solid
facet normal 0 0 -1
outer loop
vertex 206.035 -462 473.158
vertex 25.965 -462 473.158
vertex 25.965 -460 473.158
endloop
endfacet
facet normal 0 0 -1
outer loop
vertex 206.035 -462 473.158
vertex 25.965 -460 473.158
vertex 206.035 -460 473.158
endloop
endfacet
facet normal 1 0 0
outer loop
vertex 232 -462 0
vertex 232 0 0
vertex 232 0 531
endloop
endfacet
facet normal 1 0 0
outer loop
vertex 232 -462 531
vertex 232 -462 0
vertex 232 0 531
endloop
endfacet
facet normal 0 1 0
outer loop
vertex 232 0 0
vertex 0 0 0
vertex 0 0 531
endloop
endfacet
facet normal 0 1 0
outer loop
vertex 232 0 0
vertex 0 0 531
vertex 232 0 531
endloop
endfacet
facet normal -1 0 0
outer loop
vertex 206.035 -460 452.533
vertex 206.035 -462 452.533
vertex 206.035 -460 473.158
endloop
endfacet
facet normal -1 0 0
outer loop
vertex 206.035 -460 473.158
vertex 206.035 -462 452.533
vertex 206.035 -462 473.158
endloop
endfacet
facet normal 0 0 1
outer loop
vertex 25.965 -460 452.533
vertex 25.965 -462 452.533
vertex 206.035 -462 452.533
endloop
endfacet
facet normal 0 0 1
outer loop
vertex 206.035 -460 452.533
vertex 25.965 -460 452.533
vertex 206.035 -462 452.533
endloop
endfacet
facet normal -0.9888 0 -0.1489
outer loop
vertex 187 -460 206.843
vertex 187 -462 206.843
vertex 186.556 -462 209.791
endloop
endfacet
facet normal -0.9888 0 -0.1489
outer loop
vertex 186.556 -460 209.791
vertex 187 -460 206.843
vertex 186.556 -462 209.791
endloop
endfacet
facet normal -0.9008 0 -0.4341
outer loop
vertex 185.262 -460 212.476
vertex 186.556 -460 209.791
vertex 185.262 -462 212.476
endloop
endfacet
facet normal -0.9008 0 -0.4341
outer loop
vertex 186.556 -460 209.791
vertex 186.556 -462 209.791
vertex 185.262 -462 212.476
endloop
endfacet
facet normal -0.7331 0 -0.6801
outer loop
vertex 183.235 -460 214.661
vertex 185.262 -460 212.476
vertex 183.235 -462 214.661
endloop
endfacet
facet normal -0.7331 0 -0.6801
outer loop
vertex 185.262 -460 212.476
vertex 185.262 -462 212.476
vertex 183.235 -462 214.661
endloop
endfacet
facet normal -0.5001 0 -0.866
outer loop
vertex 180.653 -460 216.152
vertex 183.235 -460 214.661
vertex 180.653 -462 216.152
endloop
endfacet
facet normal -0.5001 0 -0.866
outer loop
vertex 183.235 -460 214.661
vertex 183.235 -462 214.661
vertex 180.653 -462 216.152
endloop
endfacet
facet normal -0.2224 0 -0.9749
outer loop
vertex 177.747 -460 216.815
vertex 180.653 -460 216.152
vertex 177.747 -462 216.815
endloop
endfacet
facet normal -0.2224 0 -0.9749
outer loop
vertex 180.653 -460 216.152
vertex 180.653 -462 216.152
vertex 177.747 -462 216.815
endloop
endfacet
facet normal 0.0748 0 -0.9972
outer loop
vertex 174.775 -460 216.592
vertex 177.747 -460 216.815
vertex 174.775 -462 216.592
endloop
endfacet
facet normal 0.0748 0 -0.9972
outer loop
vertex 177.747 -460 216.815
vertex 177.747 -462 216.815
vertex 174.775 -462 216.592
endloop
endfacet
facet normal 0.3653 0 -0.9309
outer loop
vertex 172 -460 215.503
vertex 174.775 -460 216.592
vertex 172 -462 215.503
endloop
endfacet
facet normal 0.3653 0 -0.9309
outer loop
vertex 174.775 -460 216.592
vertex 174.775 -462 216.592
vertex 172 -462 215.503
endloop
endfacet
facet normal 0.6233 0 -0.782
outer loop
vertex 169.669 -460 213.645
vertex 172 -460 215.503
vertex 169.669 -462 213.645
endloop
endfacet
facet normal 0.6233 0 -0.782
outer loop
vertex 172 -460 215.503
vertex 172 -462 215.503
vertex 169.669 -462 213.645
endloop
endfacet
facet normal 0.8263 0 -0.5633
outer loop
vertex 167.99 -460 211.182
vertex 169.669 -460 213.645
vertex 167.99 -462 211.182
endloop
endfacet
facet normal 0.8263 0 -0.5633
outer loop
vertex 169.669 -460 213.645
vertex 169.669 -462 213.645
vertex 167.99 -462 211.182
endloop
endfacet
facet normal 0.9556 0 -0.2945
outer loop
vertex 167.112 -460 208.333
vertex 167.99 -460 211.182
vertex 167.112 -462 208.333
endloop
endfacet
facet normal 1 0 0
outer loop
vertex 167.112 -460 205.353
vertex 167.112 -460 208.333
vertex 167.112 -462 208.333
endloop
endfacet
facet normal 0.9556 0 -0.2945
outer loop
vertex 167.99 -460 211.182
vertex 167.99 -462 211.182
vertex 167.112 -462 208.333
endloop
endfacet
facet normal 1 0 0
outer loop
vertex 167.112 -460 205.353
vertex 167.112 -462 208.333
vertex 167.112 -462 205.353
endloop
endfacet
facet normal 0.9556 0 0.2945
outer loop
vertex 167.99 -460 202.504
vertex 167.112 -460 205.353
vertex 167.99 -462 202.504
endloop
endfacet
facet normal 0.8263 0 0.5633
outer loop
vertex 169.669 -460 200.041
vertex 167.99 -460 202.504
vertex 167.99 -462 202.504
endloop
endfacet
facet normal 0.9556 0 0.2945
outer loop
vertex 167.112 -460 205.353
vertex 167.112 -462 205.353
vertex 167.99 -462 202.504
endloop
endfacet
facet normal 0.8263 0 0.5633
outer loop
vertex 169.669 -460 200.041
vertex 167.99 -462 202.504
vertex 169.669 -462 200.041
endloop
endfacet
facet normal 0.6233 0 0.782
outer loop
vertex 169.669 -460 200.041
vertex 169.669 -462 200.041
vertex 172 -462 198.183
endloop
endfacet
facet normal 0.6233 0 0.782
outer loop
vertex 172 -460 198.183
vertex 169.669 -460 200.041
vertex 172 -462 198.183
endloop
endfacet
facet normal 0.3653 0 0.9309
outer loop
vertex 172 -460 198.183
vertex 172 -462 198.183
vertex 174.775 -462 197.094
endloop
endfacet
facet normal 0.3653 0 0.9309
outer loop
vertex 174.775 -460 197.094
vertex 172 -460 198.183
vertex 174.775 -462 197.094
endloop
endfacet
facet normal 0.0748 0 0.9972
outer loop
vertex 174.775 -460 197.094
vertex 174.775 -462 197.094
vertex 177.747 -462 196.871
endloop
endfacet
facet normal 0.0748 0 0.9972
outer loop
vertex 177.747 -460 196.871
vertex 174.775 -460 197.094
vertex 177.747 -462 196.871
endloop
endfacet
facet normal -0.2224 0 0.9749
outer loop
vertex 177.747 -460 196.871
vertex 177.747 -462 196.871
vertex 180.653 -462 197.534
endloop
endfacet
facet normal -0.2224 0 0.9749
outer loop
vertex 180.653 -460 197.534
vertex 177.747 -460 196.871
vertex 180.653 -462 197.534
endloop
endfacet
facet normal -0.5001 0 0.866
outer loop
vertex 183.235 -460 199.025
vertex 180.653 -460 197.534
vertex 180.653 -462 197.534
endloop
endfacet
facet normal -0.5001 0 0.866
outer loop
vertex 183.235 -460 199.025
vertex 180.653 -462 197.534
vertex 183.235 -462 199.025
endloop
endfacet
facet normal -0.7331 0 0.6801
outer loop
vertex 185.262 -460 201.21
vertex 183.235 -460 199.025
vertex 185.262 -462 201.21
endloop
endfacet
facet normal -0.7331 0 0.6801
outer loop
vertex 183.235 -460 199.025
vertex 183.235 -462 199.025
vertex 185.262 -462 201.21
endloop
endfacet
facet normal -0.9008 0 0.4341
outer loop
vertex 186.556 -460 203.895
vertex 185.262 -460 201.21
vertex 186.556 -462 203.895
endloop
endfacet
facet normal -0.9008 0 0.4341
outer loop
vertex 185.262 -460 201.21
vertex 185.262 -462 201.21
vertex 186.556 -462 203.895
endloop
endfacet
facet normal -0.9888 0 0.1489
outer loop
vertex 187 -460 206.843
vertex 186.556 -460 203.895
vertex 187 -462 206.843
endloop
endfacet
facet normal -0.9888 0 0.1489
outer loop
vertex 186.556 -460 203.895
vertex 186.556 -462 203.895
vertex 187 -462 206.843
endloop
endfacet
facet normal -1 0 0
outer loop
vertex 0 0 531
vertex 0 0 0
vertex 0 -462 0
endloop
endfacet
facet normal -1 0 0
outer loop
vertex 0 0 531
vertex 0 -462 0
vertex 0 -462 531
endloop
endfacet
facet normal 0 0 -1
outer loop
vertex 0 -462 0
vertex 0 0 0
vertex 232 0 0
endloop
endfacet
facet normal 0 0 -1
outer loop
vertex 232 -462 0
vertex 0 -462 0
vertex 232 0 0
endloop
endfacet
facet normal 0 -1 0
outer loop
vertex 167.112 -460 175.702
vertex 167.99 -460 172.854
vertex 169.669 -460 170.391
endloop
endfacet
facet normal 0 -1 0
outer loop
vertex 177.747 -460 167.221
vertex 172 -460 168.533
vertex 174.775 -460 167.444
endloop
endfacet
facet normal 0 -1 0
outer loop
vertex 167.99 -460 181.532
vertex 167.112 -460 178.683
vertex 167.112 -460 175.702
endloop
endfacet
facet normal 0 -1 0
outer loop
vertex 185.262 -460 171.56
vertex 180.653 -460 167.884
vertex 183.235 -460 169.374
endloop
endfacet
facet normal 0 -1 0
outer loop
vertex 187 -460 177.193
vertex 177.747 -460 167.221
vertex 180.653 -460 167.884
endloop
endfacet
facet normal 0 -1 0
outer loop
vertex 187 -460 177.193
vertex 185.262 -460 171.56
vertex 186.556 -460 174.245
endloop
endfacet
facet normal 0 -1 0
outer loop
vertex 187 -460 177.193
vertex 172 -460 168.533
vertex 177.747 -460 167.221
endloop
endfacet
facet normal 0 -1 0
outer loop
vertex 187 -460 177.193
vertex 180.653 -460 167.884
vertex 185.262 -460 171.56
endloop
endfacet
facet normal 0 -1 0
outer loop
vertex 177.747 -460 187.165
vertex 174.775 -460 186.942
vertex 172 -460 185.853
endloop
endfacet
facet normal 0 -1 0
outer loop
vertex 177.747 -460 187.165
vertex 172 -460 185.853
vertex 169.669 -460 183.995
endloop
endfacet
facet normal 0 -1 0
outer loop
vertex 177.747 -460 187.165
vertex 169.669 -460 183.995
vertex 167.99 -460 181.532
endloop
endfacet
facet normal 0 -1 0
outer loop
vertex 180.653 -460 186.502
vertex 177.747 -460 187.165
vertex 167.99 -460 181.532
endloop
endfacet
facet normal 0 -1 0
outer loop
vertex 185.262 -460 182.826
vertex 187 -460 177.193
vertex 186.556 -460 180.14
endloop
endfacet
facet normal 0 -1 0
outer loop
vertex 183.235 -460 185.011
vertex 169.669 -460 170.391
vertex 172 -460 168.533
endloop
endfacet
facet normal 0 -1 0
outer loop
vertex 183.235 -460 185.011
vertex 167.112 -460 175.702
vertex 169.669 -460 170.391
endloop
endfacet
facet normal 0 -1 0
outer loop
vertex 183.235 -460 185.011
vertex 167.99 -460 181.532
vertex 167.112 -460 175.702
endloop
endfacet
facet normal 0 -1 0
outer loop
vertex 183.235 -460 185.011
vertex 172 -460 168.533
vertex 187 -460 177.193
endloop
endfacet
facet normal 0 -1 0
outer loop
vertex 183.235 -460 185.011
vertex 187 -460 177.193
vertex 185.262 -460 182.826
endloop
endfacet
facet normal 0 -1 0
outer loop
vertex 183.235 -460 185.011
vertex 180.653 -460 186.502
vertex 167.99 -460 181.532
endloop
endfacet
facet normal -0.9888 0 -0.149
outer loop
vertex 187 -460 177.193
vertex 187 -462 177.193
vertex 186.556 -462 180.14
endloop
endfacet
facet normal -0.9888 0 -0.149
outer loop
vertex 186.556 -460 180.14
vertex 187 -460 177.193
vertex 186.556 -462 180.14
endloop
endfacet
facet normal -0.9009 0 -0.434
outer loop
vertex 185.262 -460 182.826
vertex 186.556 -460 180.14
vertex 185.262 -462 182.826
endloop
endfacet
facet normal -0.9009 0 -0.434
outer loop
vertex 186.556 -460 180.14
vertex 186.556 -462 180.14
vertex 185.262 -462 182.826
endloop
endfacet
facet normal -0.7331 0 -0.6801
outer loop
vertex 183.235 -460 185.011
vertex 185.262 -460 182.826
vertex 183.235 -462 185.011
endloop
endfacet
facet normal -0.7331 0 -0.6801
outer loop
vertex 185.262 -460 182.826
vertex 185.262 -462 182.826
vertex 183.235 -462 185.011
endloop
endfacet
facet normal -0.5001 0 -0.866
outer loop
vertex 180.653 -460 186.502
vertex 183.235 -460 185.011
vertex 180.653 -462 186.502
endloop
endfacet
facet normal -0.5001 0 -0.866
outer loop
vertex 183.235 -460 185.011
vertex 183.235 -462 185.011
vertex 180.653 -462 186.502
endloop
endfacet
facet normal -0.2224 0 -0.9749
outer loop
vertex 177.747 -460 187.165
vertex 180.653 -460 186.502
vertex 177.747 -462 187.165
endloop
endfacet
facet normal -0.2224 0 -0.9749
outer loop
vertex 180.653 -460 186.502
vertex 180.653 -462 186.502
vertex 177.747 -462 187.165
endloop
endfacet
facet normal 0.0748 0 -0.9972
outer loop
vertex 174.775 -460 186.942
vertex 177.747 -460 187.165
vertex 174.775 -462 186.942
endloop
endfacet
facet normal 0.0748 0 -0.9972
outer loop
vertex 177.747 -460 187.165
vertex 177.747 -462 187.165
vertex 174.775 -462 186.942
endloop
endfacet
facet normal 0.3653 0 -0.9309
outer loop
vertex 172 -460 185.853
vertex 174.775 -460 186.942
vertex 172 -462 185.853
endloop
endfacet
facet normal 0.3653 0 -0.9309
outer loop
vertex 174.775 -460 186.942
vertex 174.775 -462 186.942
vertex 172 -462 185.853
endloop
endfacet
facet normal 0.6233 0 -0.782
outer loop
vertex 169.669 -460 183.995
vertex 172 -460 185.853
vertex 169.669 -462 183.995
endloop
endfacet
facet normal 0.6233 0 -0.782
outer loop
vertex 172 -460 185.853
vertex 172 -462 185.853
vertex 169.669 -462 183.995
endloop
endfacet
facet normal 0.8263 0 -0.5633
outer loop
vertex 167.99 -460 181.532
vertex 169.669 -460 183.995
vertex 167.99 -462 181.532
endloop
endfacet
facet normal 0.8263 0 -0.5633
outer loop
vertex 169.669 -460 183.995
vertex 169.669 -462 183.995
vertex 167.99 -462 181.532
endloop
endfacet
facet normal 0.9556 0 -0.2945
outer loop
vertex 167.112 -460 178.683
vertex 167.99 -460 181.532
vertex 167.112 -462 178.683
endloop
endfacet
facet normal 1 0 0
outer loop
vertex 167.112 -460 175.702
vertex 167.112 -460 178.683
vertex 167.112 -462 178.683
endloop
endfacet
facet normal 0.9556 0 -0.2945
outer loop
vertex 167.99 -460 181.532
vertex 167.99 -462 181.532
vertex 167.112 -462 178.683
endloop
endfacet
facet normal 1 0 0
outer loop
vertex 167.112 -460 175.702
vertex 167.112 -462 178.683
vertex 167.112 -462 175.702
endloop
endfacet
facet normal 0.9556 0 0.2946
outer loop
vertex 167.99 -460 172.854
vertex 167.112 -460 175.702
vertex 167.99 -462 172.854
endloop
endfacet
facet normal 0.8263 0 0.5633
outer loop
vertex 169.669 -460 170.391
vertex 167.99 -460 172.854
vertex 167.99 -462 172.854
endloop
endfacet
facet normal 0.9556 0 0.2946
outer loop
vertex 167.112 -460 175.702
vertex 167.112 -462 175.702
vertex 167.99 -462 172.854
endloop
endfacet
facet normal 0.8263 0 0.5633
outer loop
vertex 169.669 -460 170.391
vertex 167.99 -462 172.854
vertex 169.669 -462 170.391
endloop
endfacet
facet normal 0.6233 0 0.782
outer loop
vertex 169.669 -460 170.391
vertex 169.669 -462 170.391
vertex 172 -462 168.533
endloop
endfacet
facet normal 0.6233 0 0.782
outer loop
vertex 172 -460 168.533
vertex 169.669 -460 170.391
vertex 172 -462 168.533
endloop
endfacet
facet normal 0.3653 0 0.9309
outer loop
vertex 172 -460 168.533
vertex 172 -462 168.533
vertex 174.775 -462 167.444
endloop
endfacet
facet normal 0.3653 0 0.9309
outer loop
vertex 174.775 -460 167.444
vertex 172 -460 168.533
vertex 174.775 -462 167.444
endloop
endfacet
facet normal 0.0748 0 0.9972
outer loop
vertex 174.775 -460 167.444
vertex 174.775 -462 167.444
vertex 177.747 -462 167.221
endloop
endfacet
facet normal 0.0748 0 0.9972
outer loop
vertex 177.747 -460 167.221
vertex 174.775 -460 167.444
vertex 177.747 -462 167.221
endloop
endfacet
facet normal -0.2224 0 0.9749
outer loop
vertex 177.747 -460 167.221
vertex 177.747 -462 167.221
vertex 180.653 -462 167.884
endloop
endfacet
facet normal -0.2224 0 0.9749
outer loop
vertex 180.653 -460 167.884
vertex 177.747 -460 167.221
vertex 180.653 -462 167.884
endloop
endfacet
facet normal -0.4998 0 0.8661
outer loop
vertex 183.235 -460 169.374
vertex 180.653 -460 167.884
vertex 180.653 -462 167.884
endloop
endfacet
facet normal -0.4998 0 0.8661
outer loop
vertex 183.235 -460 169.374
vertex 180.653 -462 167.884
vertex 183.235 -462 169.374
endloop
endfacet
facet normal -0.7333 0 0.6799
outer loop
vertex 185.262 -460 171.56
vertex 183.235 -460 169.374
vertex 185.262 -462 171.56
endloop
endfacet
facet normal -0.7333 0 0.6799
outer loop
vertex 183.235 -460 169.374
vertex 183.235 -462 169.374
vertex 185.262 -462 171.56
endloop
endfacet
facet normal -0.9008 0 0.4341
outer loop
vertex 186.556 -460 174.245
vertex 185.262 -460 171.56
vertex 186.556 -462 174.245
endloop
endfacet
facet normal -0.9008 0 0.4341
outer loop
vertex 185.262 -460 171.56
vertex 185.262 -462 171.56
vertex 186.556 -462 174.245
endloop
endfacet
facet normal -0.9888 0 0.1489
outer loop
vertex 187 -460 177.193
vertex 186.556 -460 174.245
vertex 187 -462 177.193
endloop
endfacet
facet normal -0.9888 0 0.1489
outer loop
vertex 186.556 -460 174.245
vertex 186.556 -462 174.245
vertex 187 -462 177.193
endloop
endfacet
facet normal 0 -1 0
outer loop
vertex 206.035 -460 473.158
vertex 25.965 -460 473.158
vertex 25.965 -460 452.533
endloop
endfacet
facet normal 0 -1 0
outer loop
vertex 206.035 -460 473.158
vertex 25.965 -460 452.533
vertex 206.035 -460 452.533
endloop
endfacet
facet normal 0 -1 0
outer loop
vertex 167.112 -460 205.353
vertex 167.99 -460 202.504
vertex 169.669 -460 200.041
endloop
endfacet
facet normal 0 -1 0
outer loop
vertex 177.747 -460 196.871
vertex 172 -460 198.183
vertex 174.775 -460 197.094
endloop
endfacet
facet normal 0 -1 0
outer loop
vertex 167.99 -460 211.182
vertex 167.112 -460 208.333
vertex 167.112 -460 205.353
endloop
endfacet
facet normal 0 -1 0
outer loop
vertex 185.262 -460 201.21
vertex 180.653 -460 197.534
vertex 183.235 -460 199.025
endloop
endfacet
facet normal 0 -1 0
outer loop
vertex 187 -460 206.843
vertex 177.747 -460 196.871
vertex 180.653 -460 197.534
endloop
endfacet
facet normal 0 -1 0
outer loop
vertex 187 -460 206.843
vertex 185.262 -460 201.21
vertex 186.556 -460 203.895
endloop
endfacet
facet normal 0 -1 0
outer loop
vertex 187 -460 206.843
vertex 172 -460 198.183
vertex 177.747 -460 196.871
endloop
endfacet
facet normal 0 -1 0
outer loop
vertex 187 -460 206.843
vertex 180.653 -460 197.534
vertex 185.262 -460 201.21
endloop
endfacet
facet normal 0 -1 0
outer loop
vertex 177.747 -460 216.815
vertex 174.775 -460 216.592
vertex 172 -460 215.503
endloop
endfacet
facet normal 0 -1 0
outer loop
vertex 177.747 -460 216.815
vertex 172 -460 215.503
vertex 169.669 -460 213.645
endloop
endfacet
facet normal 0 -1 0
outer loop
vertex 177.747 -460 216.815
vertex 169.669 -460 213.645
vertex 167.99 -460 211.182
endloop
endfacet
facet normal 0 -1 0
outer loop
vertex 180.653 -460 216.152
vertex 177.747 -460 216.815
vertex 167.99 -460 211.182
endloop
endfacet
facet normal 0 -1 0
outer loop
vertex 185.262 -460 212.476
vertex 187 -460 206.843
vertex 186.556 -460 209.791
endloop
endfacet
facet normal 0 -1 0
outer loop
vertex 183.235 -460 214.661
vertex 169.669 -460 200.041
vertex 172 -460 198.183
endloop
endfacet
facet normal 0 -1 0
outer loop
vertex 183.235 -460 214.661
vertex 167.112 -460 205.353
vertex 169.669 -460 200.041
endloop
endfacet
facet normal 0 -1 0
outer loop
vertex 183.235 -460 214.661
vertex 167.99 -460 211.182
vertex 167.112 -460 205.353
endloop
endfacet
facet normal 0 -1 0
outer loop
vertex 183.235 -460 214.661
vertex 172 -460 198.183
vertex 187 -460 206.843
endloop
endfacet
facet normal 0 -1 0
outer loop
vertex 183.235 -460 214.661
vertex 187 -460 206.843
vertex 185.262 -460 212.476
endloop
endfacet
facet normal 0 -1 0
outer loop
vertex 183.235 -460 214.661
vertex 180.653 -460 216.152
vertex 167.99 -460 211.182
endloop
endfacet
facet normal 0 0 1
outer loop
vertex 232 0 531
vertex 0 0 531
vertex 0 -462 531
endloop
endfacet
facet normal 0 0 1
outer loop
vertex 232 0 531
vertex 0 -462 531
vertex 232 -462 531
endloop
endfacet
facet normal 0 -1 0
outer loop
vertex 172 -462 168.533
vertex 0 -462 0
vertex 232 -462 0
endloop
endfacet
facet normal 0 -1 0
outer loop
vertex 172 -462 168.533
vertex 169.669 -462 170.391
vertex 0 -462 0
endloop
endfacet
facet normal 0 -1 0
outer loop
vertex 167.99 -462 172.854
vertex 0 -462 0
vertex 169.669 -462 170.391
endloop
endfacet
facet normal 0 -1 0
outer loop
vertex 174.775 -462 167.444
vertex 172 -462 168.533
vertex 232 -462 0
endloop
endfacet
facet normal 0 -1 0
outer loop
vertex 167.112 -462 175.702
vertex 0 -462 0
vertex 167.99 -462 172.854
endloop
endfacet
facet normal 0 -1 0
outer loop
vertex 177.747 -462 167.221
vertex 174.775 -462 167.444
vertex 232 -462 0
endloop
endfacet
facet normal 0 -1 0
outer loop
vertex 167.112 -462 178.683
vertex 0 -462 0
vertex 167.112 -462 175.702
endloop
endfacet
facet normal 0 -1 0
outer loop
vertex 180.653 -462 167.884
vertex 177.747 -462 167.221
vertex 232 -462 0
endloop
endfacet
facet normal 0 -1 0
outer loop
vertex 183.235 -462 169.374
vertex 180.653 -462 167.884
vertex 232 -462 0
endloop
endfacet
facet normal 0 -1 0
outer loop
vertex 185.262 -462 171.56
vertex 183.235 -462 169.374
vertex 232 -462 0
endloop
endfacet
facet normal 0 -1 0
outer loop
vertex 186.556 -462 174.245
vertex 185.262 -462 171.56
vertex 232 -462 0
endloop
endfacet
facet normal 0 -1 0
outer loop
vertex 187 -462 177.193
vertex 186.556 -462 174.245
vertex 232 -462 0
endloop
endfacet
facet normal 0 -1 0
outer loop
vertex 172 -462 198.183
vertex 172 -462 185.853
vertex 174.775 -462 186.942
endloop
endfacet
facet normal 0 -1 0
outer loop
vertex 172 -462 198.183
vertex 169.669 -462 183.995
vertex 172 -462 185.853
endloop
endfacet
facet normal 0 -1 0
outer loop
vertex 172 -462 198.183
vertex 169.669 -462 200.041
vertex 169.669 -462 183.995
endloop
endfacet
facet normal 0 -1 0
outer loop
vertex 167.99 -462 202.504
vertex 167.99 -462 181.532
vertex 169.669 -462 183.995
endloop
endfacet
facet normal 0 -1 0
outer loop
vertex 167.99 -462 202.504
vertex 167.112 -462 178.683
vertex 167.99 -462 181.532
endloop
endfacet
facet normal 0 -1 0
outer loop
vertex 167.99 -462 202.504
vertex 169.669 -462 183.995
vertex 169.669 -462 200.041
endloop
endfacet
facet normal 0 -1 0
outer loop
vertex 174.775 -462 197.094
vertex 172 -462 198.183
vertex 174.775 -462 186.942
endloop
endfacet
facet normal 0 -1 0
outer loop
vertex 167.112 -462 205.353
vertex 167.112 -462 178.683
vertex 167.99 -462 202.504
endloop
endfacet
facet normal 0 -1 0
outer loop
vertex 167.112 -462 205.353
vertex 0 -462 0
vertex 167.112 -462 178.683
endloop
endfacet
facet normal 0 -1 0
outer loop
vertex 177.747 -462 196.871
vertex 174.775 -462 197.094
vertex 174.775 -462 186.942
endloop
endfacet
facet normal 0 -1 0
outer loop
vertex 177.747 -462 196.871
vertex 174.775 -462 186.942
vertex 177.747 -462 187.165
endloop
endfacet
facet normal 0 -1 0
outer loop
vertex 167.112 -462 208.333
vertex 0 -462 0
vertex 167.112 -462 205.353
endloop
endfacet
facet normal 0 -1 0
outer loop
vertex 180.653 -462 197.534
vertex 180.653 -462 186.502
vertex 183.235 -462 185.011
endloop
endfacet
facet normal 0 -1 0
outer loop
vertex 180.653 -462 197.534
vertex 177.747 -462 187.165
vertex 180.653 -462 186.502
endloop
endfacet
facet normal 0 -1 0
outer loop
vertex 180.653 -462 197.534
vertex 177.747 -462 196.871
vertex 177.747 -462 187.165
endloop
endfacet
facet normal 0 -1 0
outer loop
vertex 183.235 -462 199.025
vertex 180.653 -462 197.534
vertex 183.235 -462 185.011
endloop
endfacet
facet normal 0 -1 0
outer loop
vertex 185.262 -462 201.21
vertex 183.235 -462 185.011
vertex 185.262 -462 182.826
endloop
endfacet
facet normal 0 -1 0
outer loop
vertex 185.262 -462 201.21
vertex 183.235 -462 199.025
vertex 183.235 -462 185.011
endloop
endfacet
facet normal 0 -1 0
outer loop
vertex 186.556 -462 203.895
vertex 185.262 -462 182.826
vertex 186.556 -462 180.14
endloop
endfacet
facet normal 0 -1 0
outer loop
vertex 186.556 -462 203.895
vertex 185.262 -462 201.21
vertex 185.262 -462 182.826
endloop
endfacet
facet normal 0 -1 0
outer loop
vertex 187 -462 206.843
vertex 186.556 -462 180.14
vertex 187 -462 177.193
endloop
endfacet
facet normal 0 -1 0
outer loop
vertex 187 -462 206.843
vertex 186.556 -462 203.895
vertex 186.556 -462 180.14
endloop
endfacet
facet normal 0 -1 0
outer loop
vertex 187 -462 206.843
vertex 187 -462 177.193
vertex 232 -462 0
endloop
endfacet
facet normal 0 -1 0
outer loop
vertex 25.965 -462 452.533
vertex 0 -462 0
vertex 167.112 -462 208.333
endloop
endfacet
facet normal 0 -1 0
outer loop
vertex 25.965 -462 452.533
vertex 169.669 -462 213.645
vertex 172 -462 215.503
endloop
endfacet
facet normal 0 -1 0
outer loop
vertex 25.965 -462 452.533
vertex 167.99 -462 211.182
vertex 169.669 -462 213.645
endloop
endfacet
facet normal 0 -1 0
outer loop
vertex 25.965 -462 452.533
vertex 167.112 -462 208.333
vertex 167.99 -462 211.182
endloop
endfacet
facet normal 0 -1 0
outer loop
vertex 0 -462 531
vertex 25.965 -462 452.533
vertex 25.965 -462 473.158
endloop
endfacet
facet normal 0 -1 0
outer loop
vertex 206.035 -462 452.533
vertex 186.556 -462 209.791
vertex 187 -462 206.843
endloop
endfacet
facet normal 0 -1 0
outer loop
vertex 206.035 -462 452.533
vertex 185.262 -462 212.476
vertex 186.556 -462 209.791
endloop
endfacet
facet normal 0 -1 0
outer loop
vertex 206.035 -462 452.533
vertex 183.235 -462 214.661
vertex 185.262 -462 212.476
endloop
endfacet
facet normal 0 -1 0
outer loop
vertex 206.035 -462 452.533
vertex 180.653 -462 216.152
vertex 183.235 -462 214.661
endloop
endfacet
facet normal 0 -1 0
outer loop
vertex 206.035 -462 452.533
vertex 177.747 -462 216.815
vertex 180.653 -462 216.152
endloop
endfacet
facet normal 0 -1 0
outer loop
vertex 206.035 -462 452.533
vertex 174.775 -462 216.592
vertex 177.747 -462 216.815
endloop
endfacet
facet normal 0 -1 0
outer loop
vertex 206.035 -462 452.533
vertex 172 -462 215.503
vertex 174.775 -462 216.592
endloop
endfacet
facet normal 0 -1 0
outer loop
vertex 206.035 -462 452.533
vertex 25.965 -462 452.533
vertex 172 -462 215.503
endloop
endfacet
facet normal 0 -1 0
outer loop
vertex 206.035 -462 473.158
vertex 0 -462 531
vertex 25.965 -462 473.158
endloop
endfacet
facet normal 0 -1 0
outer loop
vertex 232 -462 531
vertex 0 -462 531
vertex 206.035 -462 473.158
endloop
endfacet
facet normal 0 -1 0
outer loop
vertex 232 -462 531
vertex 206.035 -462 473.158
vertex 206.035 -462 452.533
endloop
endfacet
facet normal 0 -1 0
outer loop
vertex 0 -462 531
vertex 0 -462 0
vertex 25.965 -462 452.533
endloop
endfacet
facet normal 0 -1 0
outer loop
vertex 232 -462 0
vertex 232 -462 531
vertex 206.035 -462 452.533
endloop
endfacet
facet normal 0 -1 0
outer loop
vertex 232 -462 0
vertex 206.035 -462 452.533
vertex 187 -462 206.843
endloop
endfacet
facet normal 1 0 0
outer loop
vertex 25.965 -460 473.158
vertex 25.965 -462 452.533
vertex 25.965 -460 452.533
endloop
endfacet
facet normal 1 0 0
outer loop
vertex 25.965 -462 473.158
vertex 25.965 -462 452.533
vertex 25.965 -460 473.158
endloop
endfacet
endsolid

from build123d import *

# Parameters (mm, degrees)
F0_W     = 232
F0_H     = 531
F1_DEPTH = 462
F2_W     = 180.069946
F2_H     = 20.625591
F2_R     = 10
F3_DEPTH = 2


with BuildPart() as f1:
    # F0 (on Front) → F1 (new body)
    with BuildSketch(Plane.XZ):
        with Locations((116, 265.5)):
            Rectangle(F0_W, F0_H)
    extrude(amount=F1_DEPTH)

    # F2 (on face) → F3 (cut)
    with BuildSketch(Plane.XZ.offset(462)):
        with Locations((116, 462.845355)):
            Rectangle(F2_W, F2_H)
        with Locations((177, 206.843048)):
            Circle(F2_R)
        with Locations((177, 177.192792)):
            Circle(F2_R)
    extrude(amount=-F3_DEPTH, mode=Mode.SUBTRACT)


solid = f1.part
